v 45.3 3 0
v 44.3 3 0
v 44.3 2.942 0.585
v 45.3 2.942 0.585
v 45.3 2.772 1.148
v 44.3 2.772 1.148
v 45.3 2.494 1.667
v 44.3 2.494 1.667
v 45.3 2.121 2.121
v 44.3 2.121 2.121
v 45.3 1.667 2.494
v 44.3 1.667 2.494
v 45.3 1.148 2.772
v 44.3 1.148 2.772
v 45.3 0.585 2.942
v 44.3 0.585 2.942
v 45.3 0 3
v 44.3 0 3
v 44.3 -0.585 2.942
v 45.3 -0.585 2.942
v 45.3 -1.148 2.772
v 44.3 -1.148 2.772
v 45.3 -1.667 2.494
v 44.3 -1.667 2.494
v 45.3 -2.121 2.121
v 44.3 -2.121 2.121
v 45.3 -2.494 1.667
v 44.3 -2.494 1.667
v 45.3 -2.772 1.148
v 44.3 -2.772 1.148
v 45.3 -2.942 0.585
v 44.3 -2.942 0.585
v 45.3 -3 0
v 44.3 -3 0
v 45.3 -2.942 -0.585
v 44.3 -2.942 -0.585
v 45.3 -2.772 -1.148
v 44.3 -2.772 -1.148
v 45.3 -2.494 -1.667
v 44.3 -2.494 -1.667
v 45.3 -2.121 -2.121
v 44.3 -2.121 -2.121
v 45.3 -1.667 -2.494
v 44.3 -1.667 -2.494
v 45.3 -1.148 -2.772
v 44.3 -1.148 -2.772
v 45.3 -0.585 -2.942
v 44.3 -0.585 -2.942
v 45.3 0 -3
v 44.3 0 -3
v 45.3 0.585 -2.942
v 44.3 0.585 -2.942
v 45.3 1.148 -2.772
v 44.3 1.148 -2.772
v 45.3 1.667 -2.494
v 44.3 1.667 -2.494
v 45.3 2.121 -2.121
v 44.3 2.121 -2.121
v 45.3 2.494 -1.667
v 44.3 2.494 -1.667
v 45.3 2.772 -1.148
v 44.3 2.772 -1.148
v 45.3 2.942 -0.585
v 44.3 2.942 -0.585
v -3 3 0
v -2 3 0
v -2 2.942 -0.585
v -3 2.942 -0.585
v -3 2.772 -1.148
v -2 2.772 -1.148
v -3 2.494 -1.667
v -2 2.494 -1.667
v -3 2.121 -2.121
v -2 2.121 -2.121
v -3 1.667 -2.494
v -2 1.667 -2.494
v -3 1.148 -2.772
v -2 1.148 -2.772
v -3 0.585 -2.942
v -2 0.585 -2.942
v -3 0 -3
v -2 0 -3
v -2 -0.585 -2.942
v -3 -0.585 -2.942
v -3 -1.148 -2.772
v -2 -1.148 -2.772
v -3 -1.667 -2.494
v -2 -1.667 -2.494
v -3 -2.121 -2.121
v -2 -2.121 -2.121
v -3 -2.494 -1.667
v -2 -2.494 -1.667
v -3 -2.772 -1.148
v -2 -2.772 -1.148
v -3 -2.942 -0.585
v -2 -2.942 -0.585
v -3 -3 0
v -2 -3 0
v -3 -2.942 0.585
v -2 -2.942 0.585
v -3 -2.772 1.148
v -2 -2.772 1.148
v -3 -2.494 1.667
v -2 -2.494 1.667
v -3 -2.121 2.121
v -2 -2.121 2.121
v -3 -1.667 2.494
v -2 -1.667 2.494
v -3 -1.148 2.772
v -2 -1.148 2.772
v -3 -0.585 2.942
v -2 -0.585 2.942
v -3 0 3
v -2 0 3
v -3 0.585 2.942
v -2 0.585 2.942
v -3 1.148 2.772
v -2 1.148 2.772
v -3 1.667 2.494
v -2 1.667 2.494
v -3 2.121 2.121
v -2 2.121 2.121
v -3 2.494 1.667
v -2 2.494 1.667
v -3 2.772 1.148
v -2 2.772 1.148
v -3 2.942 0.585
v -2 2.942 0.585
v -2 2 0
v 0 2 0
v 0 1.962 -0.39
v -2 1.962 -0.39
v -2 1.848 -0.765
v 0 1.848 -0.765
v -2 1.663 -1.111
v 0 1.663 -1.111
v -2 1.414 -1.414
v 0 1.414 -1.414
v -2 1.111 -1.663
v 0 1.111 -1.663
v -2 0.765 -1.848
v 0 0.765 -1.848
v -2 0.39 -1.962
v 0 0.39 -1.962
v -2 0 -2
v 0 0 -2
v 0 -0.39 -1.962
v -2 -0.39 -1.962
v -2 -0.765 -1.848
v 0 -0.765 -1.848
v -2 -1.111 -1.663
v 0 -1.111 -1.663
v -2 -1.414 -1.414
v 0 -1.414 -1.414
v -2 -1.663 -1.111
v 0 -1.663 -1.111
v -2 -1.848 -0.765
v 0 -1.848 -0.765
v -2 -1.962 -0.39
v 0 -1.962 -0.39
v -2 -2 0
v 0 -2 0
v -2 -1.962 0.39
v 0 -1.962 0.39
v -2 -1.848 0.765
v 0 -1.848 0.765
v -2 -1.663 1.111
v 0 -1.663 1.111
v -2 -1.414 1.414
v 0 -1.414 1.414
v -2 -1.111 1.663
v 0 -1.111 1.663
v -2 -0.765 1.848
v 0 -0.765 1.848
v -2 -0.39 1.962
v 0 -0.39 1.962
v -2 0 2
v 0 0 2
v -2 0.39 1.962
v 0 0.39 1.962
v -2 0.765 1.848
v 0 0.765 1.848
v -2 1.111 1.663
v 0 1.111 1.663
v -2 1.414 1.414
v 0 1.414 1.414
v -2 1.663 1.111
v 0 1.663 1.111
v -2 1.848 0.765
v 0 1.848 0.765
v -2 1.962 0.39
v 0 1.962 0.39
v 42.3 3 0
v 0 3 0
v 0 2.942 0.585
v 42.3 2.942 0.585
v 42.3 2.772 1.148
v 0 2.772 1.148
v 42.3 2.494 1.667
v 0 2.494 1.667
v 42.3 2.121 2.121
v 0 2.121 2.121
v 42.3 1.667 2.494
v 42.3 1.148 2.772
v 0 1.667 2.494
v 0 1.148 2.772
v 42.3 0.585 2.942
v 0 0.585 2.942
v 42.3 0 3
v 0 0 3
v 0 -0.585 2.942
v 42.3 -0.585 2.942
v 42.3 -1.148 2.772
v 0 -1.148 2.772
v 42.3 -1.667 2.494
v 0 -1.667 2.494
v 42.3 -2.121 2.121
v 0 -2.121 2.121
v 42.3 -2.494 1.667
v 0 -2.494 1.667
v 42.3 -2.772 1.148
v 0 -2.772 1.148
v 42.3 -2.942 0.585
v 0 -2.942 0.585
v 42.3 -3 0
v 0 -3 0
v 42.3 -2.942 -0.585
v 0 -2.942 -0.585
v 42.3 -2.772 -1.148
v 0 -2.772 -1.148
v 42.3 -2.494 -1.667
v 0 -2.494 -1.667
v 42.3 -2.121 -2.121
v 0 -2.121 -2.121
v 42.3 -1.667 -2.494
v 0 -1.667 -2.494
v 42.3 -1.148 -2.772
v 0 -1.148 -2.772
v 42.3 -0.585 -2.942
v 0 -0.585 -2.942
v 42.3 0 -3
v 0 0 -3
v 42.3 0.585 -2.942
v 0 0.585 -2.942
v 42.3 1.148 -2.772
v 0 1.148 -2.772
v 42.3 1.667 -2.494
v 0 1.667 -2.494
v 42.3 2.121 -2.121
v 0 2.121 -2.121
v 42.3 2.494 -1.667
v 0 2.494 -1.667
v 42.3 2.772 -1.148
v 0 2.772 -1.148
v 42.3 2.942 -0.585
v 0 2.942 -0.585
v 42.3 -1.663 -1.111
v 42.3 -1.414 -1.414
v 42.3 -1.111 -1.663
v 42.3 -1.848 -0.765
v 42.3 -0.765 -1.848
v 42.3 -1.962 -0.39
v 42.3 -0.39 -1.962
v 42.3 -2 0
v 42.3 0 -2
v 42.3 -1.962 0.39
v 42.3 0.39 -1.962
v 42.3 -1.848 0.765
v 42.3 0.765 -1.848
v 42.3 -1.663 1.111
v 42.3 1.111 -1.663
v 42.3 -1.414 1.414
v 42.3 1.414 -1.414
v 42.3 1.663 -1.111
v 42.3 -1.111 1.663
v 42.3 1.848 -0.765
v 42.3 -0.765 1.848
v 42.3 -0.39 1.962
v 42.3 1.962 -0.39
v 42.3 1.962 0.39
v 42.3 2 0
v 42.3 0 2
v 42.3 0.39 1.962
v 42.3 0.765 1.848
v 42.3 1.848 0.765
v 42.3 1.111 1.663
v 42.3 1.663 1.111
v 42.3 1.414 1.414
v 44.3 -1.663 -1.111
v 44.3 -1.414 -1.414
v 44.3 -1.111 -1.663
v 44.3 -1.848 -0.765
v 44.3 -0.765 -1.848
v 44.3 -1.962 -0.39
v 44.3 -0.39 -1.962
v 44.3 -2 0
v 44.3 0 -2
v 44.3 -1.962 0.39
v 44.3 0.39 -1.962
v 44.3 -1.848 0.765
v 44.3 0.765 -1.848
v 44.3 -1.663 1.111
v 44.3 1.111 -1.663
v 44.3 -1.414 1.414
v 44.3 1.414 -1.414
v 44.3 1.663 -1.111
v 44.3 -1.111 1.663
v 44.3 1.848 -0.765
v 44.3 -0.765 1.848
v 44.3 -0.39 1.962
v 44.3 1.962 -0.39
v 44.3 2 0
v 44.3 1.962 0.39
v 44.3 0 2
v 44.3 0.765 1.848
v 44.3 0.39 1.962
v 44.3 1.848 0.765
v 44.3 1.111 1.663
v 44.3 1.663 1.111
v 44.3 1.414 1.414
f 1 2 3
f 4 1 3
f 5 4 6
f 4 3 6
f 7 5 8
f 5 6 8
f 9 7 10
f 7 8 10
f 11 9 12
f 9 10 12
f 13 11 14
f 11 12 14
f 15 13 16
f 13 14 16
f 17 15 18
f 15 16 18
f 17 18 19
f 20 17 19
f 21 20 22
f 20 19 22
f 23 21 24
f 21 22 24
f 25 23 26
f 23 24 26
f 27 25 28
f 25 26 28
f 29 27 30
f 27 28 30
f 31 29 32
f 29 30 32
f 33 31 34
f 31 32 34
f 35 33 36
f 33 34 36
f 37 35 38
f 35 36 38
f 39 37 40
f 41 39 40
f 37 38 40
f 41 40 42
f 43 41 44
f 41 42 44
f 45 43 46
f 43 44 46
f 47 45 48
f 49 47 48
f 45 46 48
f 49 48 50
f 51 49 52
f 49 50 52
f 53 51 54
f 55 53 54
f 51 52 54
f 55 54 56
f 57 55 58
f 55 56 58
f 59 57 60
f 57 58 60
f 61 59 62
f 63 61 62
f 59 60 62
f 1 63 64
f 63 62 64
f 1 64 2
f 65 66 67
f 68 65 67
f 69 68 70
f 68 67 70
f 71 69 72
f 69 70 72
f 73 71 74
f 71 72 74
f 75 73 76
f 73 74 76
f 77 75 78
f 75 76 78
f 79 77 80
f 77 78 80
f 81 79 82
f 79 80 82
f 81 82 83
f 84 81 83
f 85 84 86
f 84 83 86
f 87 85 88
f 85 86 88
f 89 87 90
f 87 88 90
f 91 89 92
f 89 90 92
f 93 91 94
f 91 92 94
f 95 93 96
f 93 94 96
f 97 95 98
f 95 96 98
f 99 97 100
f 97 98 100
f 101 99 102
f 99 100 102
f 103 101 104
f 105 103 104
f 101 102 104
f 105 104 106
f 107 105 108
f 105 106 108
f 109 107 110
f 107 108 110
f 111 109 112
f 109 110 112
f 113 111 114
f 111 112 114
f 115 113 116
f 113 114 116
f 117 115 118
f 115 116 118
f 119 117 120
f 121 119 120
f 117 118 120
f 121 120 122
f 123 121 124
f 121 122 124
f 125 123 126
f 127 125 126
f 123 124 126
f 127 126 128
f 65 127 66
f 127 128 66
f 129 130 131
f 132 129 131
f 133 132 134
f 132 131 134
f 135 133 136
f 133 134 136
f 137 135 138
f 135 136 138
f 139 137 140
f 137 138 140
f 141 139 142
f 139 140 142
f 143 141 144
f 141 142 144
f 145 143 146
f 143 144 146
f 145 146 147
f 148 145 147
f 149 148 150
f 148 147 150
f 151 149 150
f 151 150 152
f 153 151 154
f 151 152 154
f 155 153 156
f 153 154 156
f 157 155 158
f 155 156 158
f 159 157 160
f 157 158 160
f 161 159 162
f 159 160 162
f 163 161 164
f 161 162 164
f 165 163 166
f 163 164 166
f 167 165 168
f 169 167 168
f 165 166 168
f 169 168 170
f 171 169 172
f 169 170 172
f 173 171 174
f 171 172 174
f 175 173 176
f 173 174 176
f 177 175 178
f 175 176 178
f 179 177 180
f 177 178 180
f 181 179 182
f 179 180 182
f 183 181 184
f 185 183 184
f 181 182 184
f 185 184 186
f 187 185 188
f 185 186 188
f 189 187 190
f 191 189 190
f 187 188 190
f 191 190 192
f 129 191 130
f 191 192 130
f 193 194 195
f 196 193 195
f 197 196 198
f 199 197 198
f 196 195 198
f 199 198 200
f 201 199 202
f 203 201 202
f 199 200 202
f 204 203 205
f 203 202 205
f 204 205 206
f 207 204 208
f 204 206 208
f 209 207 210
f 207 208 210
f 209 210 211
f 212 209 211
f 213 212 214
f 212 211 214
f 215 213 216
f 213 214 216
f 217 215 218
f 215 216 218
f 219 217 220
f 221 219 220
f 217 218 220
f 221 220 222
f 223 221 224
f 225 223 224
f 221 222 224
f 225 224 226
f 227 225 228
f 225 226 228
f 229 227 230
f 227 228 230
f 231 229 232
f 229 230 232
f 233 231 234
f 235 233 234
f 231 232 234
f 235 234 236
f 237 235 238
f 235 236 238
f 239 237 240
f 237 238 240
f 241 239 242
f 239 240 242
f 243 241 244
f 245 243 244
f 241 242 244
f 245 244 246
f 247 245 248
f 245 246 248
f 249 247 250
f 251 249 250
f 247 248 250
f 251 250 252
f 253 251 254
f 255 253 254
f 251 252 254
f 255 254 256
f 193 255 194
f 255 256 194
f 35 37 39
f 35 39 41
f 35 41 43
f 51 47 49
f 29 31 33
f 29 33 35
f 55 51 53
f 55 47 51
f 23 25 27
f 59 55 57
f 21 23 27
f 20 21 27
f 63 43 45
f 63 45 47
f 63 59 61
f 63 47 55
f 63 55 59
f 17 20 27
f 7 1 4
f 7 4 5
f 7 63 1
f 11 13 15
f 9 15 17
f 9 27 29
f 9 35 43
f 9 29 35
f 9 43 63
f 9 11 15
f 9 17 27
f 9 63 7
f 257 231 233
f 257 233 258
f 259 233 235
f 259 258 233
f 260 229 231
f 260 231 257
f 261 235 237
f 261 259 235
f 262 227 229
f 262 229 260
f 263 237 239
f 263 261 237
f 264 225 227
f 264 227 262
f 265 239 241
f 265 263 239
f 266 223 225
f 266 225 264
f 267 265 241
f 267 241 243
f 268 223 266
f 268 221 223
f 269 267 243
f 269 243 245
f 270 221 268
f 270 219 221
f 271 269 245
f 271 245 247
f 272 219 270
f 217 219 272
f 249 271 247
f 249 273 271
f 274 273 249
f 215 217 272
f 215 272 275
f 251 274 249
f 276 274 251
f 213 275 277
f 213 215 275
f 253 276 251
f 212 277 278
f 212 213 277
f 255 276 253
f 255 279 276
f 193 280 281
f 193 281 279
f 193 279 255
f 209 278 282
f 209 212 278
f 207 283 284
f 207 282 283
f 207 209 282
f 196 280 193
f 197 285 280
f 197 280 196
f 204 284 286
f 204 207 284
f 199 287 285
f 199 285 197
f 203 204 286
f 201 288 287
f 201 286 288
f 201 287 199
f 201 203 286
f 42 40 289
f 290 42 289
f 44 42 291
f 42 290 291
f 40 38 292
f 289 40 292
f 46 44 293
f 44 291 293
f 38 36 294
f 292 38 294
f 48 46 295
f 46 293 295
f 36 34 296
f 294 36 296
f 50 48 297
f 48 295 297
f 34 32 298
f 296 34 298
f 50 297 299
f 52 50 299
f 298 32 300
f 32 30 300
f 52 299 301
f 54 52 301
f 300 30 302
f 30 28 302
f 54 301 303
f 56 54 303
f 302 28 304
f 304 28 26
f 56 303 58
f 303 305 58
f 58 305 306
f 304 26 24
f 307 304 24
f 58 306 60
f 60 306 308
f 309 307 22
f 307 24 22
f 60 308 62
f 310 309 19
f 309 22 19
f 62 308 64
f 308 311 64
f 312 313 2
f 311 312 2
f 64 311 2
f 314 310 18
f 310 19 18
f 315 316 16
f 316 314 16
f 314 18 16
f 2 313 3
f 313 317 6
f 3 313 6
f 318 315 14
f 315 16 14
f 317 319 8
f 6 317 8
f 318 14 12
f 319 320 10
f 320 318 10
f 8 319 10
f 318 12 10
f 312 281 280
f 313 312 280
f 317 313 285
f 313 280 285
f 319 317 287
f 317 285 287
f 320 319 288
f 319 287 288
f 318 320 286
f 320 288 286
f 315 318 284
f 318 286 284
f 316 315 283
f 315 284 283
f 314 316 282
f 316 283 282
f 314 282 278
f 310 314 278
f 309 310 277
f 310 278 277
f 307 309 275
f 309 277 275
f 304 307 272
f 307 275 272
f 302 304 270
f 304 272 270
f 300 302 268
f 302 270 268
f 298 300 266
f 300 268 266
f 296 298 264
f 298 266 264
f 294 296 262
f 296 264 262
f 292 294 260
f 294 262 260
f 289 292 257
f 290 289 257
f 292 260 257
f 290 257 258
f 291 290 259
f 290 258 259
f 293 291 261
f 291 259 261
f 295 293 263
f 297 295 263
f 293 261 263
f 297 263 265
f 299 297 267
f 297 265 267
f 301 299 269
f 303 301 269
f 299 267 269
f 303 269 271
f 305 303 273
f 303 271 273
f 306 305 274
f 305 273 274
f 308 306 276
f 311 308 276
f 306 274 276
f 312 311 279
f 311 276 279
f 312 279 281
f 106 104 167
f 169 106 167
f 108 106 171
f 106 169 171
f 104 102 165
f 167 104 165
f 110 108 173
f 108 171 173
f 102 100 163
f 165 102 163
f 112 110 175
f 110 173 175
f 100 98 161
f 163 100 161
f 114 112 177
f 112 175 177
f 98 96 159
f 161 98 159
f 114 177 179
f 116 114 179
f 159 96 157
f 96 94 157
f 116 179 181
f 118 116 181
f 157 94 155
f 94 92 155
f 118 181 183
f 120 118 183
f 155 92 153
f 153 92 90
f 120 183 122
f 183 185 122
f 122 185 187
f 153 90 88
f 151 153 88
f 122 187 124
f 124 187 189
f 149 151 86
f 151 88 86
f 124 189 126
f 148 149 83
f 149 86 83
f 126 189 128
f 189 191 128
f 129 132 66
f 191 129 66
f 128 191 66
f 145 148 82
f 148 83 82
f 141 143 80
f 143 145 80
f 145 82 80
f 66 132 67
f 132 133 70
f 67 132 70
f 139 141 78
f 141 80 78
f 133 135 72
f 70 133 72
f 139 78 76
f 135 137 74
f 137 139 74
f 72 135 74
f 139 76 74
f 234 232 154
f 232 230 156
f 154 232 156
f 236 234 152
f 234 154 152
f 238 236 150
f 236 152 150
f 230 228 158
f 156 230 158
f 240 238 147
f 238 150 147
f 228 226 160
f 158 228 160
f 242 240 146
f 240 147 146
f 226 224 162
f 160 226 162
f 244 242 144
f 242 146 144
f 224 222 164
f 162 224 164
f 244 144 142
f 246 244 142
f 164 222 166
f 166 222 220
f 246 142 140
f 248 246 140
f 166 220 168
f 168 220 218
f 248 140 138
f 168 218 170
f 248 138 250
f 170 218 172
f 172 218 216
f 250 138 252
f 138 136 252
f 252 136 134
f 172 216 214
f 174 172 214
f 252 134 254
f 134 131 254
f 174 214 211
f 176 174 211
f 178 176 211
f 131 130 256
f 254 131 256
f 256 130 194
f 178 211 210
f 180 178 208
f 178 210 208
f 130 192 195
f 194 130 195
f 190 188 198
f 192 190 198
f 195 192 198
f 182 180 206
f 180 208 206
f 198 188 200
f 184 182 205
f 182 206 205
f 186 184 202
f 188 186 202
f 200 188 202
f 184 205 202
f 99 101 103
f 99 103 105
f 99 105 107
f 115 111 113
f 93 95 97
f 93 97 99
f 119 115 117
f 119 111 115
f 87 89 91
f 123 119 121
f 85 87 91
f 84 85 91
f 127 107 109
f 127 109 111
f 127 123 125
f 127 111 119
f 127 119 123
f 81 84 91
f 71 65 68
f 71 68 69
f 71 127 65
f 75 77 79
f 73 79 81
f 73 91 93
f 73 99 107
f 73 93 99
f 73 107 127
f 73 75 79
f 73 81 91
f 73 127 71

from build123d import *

# Parameters (mm, degrees)
SKETCH_R     = 3
PAD_DEPTH    = 42.3
SKETCH001_R  = 2
PAD001_DEPTH = 2
SKETCH002_R  = 3
PAD002_DEPTH = 1
SKETCH003_R  = 2
PAD003_DEPTH = 2
SKETCH004_R  = 3
PAD004_DEPTH = 1


with BuildPart() as part:
    # Sketch → Pad (new body)
    with BuildSketch(Plane.YZ):
        Circle(SKETCH_R)
    extrude(amount=PAD_DEPTH)

    # Sketch001 (on Face3 of Pad) → Pad001 (join)
    with BuildSketch(Plane.YZ.offset(42.3)):
        Circle(SKETCH001_R)
    extrude(amount=PAD001_DEPTH)

    # Sketch002 (on Face5 of Pad001) → Pad002 (join)
    with BuildSketch(Plane.YZ.offset(44.3)):
        Circle(SKETCH002_R)
    extrude(amount=PAD002_DEPTH)

    # Sketch003 (on Face7 of Pad002) → Pad003 (join)
    with BuildSketch(Plane(origin=(0, 0, 0), x_dir=(0, 1, 0), z_dir=(-1, 0, 0))):
        Circle(SKETCH003_R)
    extrude(amount=PAD003_DEPTH)

    # Sketch004 (on Face9 of Pad003) → Pad004 (join)
    with BuildSketch(Plane(origin=(-2, 0, 0), x_dir=(0, 1, 0), z_dir=(-1, 0, 0))):
        Circle(SKETCH004_R)
    extrude(amount=PAD004_DEPTH)


solid = part.part
